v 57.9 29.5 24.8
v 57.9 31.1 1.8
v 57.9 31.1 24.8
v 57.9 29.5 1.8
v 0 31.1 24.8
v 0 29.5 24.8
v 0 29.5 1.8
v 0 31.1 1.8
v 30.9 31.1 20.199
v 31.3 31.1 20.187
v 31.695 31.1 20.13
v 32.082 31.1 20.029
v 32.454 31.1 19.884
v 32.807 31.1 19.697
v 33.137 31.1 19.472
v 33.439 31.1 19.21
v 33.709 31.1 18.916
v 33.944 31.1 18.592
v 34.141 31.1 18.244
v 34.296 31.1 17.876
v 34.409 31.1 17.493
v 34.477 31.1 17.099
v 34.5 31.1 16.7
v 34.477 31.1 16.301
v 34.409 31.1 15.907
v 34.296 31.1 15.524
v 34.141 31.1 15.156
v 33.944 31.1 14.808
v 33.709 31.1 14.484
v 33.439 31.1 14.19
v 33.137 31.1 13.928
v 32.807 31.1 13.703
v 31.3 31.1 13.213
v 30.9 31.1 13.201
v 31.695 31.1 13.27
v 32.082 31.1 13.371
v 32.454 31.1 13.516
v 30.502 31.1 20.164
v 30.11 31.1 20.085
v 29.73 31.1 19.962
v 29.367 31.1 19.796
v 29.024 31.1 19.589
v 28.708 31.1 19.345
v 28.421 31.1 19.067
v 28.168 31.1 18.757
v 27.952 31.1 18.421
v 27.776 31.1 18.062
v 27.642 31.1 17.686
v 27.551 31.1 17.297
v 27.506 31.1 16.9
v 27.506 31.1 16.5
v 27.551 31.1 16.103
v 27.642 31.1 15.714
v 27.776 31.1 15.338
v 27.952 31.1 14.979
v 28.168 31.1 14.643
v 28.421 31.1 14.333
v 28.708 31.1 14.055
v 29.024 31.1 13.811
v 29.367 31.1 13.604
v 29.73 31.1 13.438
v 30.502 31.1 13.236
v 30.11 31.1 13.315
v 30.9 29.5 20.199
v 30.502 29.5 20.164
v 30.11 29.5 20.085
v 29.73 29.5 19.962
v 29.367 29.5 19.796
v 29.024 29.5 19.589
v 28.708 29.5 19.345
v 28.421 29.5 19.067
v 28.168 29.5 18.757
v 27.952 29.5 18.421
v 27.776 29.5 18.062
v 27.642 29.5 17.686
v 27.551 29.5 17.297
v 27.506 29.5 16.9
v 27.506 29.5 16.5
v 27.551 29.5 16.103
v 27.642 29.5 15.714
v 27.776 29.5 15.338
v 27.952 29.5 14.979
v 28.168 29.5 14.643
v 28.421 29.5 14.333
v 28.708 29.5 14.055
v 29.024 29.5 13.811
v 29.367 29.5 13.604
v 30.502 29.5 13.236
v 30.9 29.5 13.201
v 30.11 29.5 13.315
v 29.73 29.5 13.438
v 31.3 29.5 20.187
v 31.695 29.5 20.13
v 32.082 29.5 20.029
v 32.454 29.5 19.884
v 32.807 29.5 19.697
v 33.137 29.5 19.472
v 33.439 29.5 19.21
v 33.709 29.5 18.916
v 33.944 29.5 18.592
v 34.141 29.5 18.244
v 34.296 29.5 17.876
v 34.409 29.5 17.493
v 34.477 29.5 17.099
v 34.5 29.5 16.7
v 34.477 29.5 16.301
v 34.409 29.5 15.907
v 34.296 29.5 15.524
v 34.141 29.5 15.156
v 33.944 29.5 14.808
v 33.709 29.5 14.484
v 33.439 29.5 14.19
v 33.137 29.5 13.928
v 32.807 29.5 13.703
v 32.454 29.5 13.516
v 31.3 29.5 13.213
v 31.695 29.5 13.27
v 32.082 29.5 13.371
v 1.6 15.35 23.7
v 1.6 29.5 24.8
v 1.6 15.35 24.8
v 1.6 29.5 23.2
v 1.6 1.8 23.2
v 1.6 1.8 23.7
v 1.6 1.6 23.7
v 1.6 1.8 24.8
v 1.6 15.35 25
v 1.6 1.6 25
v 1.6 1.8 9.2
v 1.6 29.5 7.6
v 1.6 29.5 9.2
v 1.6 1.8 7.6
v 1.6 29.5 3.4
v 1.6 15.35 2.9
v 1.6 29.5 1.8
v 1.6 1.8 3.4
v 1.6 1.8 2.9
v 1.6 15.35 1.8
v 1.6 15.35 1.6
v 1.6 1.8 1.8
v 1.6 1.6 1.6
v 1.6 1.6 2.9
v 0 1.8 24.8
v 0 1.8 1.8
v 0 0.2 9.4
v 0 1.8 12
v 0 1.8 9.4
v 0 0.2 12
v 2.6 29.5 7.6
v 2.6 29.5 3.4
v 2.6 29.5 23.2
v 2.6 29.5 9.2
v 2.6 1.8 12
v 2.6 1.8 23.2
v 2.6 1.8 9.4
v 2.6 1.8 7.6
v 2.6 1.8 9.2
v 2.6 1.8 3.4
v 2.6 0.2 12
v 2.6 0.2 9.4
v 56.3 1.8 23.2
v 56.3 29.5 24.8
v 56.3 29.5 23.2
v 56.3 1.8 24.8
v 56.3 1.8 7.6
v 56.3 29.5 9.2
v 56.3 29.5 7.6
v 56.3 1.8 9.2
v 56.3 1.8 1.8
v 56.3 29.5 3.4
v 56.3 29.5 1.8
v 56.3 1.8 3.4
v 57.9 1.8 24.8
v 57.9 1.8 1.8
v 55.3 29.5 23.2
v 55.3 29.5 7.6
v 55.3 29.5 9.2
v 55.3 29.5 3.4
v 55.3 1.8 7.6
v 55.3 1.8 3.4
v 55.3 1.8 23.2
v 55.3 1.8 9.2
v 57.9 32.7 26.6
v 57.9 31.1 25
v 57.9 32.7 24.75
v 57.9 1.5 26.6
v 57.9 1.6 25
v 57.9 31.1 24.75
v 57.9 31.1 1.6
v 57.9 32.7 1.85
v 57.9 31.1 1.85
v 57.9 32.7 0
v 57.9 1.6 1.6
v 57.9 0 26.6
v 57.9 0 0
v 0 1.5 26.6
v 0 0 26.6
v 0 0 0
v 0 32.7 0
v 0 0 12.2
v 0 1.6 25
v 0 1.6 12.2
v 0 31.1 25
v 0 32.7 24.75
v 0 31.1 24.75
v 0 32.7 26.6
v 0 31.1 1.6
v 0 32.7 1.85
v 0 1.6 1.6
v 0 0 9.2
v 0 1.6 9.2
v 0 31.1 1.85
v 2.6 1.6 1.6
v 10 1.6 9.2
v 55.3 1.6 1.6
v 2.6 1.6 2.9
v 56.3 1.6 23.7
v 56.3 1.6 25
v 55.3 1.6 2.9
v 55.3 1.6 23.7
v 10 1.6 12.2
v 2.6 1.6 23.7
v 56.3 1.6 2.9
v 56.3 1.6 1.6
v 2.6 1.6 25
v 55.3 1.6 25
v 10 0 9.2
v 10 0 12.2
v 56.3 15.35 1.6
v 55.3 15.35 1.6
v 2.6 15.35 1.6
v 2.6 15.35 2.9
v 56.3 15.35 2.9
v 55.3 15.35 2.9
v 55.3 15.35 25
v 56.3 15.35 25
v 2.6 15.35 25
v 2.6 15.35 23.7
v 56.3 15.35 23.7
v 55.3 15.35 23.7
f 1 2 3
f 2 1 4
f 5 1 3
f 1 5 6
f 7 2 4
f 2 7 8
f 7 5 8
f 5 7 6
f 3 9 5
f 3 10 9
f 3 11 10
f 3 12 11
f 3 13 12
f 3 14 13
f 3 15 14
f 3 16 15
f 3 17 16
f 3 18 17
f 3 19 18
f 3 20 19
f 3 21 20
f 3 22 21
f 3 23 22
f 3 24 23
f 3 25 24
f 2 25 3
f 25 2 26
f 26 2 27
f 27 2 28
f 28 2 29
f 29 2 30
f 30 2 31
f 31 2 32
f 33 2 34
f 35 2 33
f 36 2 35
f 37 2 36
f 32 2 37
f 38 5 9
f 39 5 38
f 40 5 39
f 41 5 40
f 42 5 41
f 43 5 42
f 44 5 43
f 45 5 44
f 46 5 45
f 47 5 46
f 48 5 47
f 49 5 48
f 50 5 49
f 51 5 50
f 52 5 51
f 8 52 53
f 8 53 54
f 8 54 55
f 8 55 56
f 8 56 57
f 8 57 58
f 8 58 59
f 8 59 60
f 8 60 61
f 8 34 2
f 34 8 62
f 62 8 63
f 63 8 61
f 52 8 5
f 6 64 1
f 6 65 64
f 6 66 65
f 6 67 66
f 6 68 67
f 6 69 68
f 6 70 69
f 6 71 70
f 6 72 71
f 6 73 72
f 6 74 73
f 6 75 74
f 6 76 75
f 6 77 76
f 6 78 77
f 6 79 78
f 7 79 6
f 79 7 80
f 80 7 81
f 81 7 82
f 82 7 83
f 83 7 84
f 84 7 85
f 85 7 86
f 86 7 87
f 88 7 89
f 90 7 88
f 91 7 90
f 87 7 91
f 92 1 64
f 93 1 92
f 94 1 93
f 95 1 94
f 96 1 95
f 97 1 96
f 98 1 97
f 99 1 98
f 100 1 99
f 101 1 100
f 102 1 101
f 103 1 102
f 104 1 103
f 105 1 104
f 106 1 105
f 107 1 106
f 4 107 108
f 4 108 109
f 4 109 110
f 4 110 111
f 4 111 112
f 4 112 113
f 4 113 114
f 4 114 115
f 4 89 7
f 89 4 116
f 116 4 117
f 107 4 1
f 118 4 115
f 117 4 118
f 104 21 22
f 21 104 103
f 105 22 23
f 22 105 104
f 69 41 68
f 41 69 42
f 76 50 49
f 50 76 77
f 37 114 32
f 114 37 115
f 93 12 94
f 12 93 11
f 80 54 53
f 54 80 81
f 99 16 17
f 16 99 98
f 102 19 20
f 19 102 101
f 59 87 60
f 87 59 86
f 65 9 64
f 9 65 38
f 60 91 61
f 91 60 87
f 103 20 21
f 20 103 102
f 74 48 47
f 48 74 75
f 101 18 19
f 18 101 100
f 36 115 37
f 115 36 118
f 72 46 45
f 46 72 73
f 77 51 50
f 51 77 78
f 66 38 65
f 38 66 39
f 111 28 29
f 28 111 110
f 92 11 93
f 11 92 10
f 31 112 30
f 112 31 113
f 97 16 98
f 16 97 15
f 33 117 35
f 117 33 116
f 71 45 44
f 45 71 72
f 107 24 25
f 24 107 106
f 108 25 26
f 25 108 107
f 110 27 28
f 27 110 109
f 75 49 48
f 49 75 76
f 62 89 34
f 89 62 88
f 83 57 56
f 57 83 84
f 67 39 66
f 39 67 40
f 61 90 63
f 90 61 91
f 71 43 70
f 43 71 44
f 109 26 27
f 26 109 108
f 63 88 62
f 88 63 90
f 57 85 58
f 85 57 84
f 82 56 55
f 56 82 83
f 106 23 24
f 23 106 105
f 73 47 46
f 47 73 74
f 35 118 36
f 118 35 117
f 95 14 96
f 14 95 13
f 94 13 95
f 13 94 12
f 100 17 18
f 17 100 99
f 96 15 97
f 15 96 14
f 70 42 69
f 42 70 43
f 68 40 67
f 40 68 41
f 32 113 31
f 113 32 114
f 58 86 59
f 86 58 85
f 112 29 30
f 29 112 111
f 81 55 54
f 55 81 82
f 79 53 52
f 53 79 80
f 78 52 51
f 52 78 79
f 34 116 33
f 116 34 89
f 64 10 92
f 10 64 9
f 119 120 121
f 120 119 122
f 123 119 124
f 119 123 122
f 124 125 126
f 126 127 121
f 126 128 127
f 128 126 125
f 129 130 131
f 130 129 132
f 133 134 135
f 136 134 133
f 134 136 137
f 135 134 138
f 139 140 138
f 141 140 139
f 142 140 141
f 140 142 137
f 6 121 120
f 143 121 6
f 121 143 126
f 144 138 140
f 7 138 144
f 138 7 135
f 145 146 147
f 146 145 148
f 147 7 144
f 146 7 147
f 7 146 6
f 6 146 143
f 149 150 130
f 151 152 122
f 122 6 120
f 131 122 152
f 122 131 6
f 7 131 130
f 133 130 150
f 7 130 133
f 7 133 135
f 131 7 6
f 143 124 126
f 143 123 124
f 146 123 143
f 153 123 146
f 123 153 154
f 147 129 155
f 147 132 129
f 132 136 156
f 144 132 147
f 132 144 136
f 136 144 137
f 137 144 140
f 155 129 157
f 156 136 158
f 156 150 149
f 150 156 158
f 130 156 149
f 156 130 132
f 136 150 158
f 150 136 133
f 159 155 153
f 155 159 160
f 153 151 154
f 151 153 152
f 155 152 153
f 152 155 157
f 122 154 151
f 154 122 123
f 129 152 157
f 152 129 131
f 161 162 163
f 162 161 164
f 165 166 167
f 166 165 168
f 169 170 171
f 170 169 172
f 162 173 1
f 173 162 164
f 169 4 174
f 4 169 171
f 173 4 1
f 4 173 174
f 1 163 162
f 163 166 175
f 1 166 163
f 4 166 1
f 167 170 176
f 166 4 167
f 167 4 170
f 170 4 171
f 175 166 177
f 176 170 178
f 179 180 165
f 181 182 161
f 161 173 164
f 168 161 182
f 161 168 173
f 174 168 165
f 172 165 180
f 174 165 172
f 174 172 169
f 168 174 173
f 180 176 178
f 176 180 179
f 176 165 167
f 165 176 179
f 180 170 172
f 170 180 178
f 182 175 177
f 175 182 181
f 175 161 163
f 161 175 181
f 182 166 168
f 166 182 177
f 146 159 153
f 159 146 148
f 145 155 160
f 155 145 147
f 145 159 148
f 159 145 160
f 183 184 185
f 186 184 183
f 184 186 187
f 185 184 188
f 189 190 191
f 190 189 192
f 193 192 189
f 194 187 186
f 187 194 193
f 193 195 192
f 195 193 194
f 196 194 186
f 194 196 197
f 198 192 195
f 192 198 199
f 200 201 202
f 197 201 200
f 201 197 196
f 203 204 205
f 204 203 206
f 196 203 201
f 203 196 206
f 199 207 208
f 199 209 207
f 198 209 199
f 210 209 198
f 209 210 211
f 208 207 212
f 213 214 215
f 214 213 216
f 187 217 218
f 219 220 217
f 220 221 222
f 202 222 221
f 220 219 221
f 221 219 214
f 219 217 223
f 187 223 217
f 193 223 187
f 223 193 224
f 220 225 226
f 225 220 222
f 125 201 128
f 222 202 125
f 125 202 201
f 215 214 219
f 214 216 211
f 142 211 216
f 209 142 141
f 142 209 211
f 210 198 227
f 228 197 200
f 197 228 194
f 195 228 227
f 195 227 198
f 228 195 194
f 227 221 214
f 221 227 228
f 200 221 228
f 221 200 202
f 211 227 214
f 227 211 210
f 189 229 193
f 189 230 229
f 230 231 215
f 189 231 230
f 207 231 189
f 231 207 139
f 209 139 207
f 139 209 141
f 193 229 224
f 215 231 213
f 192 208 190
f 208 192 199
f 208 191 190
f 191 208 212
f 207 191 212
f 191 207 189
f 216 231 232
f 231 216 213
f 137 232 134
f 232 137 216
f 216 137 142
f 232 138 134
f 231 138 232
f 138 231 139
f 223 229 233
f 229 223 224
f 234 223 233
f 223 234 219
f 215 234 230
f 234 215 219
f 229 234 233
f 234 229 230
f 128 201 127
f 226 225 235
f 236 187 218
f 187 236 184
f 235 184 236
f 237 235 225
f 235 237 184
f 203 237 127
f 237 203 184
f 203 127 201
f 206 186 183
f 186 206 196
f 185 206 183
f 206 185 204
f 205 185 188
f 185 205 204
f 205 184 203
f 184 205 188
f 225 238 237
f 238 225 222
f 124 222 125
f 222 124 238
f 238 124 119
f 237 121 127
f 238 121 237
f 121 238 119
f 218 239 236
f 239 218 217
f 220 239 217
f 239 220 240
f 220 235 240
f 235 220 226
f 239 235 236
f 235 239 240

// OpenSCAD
// file: Maße.scad
// Gehäuse für Mikrofon Interface, Maße

// Resolution for 3D printing:
$fa = 1;
$fs = 0.4;

// Allgemeines:
delta                  =   0.1; // Standard Durchdringung

// Luft zwischen getrennten Teilen:
luft                   =   0.2;

// Gehäuse Dicke
gehaeuse_dicke         = 1.6;

// Abmessungen der Platine:
platine_breite         =  54.5 + luft; // X
platine_tiefe          =  27.5 + luft; // Y
platine_dicke          =   1.6 + luft; // Z

// Platz nötig unterhalb der Platine:
platine_bodenfreiheit  =   4.0; 

// Platz nötig oberhalb der Platine:
platine_lichtefreiheit =  14.0;

// Größe der Raste zum Einrasten von Teil 2 in Teil 1
raste_z                =   0.25;

// Kabeldurchführung nach vorne:
aussparung_breite      =  10.0;
aussparung_hoehe       =   3.0;

// Steg zur Halterung der Platine:
steg_breite            =   1.0;

// Platine in Blau:
module platine() {
    color("blue", 1.0) {
        translate([luft / 2, luft / 2, luft / 2])
            cube([platine_breite, platine_tiefe, platine_dicke]);
    }
}

//platine();
// file: Part2.scad
include <Maße.scad>

module part2_aussparung() {
    translate([-delta, -delta,
               2 * gehaeuse_dicke + platine_bodenfreiheit
               + platine_dicke + luft])
    cube([aussparung_breite + delta, gehaeuse_dicke + 2*delta,
          aussparung_hoehe]);
}

module part2_front_platte() {
    cube([2 * gehaeuse_dicke + platine_breite,
          gehaeuse_dicke,
          4 * gehaeuse_dicke + platine_bodenfreiheit
        + platine_dicke + platine_lichtefreiheit + 2 * luft]);
}

module part2_front() {
    difference() {
        part2_front_platte();
        part2_aussparung();
    }
}

module schiene() {
    cube([steg_breite, platine_tiefe / 2, gehaeuse_dicke - luft]);
}

module part2_boden() {
    translate([0, gehaeuse_dicke - delta, 0])
        cube([2 * gehaeuse_dicke + platine_breite,
              platine_tiefe + delta +  2 * gehaeuse_dicke + luft,
              gehaeuse_dicke]);
    // Raste:
    translate([0, platine_tiefe + 2 * gehaeuse_dicke + luft,
               gehaeuse_dicke - delta])
        cube([2 * gehaeuse_dicke + platine_breite, 
              gehaeuse_dicke, raste_z + delta]);
    // Schiene links:
    translate([gehaeuse_dicke, gehaeuse_dicke - delta,
               gehaeuse_dicke - delta])
        schiene();
    // Schiene rechts:
    translate([gehaeuse_dicke + platine_breite - steg_breite,
               gehaeuse_dicke - delta, gehaeuse_dicke - delta])
        schiene();
}

module part2_deckel() {
    mirror([0, 0, 1])
        translate([0, 0, 
                - 4 * gehaeuse_dicke - platine_bodenfreiheit
                - platine_dicke - platine_lichtefreiheit
                - 2 * luft])
            part2_boden();
}

module part2() {
    part2_front();
    part2_boden();
    part2_deckel();
}

//part2();
// file: Part1.scad
// Mikrofon Interface - Teil 1:
include <Maße.scad>

// Resolution for 3D printing:
$fa = 1;
$fs = 0.4;

// Loch für die Eingangsbuchse
loch_durchm =  7.0;
loch_z      =  7.5; // Über der Platine
loch_x      = 31.0; // X-Achse relativ zur Platine

module part1_loch() {
    translate([0, gehaeuse_dicke / 2, 0]) {
    rotate([90, 0, 0])
            cylinder(d = loch_durchm,
                     h = gehaeuse_dicke + 2 * delta,
                     center = true);
    }
}

module part1_boden_platte() {
    cube([platine_breite + 2 * gehaeuse_dicke,
          gehaeuse_dicke,
          2 * gehaeuse_dicke + platine_bodenfreiheit
            + platine_dicke + platine_lichtefreiheit]);
}

module part1_boden() {
    difference() {
        part1_boden_platte();
            union() {
                translate([loch_x, 0,
                           gehaeuse_dicke
                         + platine_bodenfreiheit
                         + platine_dicke + loch_z])
                    part1_loch();
        }
    }
}

module part1_left() {
    translate([0, 0, 0])
        cube([gehaeuse_dicke, platine_tiefe, 
              2 * gehaeuse_dicke + platine_bodenfreiheit
                + platine_dicke + platine_lichtefreiheit]);
    // Steg unten:
    translate([gehaeuse_dicke, 0, gehaeuse_dicke])
        cube([steg_breite, platine_tiefe,
              platine_dicke + platine_bodenfreiheit
            - gehaeuse_dicke]);
    // Steg oben:
    translate([gehaeuse_dicke, 0, 
               gehaeuse_dicke + platine_bodenfreiheit
               + platine_dicke])
        cube([steg_breite, platine_tiefe,
              platine_lichtefreiheit]);
    
}

module part1_right() {
    translate([platine_breite + 2 * gehaeuse_dicke, 0, 0])
    mirror([1, 0, 0])
        part1_left();
}

abstand = 0.2; // Abstand des Knubbels für die Kabeldurchführung

module part1() {
    translate([0, gehaeuse_dicke, 0]) {
        translate([0, platine_tiefe, 0])
            part1_boden();
        part1_left();
        part1_right();
    }

    translate([0, 0,
               gehaeuse_dicke + platine_bodenfreiheit
             + platine_dicke + abstand]) 
        cube([gehaeuse_dicke + steg_breite, gehaeuse_dicke + delta,
              aussparung_hoehe - 2 * abstand]);
}

//part1();
// main file
include <Part1.scad>
include <Part2.scad>

versatz =   5;

translate([0, luft, gehaeuse_dicke + luft]) color("yellow", 0.5) {
    part1();
}
    
color("red",    1.0) { 
    part2();
}

//translate([gehaeuse_dicke,
//           gehaeuse_dicke,
//           2 * gehaeuse_dicke + platine_bodenfreiheit])
//    platine();
